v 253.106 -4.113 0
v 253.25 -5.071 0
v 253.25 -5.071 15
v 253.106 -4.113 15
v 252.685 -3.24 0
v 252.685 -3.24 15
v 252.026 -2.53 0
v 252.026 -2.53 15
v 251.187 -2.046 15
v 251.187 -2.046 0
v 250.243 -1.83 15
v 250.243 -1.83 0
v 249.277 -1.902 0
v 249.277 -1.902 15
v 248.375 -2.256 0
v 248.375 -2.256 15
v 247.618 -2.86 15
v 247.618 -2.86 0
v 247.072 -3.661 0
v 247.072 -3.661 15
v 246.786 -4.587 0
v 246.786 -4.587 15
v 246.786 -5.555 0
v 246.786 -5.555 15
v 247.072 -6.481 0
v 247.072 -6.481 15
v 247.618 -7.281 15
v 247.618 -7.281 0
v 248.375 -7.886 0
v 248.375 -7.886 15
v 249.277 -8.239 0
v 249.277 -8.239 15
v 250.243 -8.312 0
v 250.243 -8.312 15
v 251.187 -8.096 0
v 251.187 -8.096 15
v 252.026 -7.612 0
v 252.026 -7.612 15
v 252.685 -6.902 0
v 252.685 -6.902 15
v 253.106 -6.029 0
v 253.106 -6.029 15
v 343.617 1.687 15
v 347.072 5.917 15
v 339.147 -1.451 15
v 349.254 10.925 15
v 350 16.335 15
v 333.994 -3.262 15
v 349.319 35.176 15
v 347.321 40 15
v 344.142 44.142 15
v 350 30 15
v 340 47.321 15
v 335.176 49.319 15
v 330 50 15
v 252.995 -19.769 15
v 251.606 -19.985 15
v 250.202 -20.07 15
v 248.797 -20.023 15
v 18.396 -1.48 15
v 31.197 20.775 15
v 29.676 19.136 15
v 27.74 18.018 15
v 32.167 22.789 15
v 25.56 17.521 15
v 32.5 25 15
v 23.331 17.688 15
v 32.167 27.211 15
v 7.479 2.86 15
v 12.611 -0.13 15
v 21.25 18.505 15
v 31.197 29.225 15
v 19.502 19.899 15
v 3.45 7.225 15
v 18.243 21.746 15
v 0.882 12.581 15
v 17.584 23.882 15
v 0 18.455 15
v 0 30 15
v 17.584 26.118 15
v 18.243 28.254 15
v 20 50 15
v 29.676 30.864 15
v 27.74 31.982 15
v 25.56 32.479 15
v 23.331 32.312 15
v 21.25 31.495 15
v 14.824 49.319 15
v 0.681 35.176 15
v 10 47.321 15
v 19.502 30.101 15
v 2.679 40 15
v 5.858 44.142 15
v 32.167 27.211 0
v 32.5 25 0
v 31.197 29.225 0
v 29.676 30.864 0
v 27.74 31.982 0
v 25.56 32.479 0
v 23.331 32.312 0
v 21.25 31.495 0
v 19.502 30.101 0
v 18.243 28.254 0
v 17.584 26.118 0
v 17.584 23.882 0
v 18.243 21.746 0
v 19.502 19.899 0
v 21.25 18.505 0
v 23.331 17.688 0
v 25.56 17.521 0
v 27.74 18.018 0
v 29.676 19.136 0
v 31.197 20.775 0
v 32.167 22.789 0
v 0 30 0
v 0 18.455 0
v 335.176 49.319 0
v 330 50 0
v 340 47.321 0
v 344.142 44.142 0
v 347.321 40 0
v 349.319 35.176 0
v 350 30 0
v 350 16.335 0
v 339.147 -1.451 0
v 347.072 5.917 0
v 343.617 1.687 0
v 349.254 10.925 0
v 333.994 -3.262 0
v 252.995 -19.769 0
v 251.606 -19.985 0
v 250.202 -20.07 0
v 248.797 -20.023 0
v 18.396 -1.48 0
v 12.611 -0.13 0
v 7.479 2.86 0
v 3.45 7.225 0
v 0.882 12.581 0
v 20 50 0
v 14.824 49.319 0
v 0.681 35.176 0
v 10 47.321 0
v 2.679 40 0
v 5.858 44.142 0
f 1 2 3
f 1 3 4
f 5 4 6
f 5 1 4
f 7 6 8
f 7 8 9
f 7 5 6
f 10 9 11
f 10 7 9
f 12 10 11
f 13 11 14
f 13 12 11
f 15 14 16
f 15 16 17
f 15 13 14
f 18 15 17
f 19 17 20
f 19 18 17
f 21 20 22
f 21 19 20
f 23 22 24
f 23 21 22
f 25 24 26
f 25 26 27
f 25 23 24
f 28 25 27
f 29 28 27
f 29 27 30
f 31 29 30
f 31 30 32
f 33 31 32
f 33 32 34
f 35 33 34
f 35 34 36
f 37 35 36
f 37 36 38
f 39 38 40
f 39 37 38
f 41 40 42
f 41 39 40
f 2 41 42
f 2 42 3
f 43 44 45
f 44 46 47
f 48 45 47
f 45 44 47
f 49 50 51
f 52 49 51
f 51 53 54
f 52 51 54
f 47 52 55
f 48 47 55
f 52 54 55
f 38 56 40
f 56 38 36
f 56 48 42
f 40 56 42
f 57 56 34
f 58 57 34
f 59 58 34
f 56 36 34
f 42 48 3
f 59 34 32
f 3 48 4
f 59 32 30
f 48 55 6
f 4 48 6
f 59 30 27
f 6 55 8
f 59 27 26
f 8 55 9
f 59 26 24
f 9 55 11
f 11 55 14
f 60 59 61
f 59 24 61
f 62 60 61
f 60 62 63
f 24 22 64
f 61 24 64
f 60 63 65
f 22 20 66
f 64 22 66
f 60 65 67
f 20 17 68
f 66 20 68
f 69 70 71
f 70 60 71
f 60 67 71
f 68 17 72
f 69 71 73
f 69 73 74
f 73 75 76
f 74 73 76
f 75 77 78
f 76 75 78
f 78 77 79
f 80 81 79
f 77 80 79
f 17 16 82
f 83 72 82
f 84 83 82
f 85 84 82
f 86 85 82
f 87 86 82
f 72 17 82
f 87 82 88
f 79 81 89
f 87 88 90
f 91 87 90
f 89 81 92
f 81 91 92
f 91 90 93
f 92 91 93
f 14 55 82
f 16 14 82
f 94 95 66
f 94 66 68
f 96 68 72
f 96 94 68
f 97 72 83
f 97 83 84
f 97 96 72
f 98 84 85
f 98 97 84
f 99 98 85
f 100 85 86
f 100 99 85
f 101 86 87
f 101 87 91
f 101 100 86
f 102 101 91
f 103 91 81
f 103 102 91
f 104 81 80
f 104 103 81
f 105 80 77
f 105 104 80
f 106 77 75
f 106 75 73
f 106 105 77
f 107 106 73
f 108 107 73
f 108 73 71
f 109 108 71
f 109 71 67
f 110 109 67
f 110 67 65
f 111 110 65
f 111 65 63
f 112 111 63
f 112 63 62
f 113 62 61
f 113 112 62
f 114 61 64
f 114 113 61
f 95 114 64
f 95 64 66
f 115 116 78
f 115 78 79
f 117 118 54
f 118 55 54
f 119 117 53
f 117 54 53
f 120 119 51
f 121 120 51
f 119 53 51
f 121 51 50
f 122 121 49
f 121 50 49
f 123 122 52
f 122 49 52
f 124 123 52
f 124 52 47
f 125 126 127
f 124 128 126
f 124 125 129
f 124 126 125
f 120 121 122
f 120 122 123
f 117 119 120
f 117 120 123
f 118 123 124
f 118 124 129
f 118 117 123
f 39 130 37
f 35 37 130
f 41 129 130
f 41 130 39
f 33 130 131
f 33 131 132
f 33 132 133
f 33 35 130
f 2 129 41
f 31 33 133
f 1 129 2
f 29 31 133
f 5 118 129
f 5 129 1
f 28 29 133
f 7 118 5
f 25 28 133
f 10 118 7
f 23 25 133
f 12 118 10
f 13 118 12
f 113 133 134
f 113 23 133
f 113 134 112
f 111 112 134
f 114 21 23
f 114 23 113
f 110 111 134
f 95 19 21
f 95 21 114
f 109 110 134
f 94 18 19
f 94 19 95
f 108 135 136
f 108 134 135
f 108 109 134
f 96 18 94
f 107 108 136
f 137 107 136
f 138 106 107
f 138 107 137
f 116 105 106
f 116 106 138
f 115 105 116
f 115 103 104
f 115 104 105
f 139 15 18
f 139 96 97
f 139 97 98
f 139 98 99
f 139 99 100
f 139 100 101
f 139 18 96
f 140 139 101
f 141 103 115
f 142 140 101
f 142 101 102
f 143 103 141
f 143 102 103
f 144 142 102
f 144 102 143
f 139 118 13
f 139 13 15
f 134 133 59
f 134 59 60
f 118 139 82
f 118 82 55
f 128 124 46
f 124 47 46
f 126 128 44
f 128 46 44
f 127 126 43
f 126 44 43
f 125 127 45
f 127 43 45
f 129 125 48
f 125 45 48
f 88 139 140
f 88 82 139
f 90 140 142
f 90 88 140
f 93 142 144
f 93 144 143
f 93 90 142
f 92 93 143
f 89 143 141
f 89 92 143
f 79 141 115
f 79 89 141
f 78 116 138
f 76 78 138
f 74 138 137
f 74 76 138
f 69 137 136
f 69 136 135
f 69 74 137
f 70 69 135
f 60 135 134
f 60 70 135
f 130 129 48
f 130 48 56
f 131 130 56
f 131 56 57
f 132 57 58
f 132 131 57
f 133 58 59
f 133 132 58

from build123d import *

# Parameters (mm, degrees)
SKETCH1_R           = 7.5
SKETCH1_R_2         = 3.25
BOSS_EXTRUDE1_DEPTH = 15
FILLET1_R           = 20
FILLET2_R           = 20
FILLET3_R           = 20
FILLET4_R           = 20


with BuildPart() as part:
    # Sketch1 → Boss-Extrude1 (new body)
    with BuildSketch(Plane.XY):
        with BuildLine():
            Line((75, 50), (105, 50))
            Line((105, 50), (350, 50))
            Line((350, 50), (350, 3.7471e-05))
            Line((350, 3.7471e-05), (252.995324667, -19.768817559))
            ThreePointArc((252.995324667, -19.768817559), (250.90496409, -20.043601976), (248.796724988, -20.022585277))
            Line((248.796724988, -20.022585277), (0, 0))
            Line((0, 0), (0, 50))
            Line((0, 50), (75, 50))
        make_face()
        with Locations((25, 25)):
            Circle(SKETCH1_R, mode=Mode.SUBTRACT)
        with Locations((250, -5.070925528)):
            Circle(SKETCH1_R_2, mode=Mode.SUBTRACT)
    extrude(amount=BOSS_EXTRUDE1_DEPTH)

    # Fillet1
    fillet1_edges = [part.edges().sort_by_distance(p)[0] for p in [
        (0, 50, 7.5),
    ]]
    fillet(fillet1_edges, radius=FILLET1_R)

    # Fillet2
    fillet2_edges = [part.edges().sort_by_distance(p)[0] for p in [
        (0, 0, 7.5),
    ]]
    fillet(fillet2_edges, radius=FILLET2_R)

    # Fillet3
    fillet3_edges = [part.edges().sort_by_distance(p)[0] for p in [
        (350, 50, 7.5),
    ]]
    fillet(fillet3_edges, radius=FILLET3_R)

    # Fillet4
    fillet4_edges = [part.edges().sort_by_distance(p)[0] for p in [
        (350, 3.7471e-05, 7.5),
    ]]
    fillet(fillet4_edges, radius=FILLET4_R)


solid = part.part
